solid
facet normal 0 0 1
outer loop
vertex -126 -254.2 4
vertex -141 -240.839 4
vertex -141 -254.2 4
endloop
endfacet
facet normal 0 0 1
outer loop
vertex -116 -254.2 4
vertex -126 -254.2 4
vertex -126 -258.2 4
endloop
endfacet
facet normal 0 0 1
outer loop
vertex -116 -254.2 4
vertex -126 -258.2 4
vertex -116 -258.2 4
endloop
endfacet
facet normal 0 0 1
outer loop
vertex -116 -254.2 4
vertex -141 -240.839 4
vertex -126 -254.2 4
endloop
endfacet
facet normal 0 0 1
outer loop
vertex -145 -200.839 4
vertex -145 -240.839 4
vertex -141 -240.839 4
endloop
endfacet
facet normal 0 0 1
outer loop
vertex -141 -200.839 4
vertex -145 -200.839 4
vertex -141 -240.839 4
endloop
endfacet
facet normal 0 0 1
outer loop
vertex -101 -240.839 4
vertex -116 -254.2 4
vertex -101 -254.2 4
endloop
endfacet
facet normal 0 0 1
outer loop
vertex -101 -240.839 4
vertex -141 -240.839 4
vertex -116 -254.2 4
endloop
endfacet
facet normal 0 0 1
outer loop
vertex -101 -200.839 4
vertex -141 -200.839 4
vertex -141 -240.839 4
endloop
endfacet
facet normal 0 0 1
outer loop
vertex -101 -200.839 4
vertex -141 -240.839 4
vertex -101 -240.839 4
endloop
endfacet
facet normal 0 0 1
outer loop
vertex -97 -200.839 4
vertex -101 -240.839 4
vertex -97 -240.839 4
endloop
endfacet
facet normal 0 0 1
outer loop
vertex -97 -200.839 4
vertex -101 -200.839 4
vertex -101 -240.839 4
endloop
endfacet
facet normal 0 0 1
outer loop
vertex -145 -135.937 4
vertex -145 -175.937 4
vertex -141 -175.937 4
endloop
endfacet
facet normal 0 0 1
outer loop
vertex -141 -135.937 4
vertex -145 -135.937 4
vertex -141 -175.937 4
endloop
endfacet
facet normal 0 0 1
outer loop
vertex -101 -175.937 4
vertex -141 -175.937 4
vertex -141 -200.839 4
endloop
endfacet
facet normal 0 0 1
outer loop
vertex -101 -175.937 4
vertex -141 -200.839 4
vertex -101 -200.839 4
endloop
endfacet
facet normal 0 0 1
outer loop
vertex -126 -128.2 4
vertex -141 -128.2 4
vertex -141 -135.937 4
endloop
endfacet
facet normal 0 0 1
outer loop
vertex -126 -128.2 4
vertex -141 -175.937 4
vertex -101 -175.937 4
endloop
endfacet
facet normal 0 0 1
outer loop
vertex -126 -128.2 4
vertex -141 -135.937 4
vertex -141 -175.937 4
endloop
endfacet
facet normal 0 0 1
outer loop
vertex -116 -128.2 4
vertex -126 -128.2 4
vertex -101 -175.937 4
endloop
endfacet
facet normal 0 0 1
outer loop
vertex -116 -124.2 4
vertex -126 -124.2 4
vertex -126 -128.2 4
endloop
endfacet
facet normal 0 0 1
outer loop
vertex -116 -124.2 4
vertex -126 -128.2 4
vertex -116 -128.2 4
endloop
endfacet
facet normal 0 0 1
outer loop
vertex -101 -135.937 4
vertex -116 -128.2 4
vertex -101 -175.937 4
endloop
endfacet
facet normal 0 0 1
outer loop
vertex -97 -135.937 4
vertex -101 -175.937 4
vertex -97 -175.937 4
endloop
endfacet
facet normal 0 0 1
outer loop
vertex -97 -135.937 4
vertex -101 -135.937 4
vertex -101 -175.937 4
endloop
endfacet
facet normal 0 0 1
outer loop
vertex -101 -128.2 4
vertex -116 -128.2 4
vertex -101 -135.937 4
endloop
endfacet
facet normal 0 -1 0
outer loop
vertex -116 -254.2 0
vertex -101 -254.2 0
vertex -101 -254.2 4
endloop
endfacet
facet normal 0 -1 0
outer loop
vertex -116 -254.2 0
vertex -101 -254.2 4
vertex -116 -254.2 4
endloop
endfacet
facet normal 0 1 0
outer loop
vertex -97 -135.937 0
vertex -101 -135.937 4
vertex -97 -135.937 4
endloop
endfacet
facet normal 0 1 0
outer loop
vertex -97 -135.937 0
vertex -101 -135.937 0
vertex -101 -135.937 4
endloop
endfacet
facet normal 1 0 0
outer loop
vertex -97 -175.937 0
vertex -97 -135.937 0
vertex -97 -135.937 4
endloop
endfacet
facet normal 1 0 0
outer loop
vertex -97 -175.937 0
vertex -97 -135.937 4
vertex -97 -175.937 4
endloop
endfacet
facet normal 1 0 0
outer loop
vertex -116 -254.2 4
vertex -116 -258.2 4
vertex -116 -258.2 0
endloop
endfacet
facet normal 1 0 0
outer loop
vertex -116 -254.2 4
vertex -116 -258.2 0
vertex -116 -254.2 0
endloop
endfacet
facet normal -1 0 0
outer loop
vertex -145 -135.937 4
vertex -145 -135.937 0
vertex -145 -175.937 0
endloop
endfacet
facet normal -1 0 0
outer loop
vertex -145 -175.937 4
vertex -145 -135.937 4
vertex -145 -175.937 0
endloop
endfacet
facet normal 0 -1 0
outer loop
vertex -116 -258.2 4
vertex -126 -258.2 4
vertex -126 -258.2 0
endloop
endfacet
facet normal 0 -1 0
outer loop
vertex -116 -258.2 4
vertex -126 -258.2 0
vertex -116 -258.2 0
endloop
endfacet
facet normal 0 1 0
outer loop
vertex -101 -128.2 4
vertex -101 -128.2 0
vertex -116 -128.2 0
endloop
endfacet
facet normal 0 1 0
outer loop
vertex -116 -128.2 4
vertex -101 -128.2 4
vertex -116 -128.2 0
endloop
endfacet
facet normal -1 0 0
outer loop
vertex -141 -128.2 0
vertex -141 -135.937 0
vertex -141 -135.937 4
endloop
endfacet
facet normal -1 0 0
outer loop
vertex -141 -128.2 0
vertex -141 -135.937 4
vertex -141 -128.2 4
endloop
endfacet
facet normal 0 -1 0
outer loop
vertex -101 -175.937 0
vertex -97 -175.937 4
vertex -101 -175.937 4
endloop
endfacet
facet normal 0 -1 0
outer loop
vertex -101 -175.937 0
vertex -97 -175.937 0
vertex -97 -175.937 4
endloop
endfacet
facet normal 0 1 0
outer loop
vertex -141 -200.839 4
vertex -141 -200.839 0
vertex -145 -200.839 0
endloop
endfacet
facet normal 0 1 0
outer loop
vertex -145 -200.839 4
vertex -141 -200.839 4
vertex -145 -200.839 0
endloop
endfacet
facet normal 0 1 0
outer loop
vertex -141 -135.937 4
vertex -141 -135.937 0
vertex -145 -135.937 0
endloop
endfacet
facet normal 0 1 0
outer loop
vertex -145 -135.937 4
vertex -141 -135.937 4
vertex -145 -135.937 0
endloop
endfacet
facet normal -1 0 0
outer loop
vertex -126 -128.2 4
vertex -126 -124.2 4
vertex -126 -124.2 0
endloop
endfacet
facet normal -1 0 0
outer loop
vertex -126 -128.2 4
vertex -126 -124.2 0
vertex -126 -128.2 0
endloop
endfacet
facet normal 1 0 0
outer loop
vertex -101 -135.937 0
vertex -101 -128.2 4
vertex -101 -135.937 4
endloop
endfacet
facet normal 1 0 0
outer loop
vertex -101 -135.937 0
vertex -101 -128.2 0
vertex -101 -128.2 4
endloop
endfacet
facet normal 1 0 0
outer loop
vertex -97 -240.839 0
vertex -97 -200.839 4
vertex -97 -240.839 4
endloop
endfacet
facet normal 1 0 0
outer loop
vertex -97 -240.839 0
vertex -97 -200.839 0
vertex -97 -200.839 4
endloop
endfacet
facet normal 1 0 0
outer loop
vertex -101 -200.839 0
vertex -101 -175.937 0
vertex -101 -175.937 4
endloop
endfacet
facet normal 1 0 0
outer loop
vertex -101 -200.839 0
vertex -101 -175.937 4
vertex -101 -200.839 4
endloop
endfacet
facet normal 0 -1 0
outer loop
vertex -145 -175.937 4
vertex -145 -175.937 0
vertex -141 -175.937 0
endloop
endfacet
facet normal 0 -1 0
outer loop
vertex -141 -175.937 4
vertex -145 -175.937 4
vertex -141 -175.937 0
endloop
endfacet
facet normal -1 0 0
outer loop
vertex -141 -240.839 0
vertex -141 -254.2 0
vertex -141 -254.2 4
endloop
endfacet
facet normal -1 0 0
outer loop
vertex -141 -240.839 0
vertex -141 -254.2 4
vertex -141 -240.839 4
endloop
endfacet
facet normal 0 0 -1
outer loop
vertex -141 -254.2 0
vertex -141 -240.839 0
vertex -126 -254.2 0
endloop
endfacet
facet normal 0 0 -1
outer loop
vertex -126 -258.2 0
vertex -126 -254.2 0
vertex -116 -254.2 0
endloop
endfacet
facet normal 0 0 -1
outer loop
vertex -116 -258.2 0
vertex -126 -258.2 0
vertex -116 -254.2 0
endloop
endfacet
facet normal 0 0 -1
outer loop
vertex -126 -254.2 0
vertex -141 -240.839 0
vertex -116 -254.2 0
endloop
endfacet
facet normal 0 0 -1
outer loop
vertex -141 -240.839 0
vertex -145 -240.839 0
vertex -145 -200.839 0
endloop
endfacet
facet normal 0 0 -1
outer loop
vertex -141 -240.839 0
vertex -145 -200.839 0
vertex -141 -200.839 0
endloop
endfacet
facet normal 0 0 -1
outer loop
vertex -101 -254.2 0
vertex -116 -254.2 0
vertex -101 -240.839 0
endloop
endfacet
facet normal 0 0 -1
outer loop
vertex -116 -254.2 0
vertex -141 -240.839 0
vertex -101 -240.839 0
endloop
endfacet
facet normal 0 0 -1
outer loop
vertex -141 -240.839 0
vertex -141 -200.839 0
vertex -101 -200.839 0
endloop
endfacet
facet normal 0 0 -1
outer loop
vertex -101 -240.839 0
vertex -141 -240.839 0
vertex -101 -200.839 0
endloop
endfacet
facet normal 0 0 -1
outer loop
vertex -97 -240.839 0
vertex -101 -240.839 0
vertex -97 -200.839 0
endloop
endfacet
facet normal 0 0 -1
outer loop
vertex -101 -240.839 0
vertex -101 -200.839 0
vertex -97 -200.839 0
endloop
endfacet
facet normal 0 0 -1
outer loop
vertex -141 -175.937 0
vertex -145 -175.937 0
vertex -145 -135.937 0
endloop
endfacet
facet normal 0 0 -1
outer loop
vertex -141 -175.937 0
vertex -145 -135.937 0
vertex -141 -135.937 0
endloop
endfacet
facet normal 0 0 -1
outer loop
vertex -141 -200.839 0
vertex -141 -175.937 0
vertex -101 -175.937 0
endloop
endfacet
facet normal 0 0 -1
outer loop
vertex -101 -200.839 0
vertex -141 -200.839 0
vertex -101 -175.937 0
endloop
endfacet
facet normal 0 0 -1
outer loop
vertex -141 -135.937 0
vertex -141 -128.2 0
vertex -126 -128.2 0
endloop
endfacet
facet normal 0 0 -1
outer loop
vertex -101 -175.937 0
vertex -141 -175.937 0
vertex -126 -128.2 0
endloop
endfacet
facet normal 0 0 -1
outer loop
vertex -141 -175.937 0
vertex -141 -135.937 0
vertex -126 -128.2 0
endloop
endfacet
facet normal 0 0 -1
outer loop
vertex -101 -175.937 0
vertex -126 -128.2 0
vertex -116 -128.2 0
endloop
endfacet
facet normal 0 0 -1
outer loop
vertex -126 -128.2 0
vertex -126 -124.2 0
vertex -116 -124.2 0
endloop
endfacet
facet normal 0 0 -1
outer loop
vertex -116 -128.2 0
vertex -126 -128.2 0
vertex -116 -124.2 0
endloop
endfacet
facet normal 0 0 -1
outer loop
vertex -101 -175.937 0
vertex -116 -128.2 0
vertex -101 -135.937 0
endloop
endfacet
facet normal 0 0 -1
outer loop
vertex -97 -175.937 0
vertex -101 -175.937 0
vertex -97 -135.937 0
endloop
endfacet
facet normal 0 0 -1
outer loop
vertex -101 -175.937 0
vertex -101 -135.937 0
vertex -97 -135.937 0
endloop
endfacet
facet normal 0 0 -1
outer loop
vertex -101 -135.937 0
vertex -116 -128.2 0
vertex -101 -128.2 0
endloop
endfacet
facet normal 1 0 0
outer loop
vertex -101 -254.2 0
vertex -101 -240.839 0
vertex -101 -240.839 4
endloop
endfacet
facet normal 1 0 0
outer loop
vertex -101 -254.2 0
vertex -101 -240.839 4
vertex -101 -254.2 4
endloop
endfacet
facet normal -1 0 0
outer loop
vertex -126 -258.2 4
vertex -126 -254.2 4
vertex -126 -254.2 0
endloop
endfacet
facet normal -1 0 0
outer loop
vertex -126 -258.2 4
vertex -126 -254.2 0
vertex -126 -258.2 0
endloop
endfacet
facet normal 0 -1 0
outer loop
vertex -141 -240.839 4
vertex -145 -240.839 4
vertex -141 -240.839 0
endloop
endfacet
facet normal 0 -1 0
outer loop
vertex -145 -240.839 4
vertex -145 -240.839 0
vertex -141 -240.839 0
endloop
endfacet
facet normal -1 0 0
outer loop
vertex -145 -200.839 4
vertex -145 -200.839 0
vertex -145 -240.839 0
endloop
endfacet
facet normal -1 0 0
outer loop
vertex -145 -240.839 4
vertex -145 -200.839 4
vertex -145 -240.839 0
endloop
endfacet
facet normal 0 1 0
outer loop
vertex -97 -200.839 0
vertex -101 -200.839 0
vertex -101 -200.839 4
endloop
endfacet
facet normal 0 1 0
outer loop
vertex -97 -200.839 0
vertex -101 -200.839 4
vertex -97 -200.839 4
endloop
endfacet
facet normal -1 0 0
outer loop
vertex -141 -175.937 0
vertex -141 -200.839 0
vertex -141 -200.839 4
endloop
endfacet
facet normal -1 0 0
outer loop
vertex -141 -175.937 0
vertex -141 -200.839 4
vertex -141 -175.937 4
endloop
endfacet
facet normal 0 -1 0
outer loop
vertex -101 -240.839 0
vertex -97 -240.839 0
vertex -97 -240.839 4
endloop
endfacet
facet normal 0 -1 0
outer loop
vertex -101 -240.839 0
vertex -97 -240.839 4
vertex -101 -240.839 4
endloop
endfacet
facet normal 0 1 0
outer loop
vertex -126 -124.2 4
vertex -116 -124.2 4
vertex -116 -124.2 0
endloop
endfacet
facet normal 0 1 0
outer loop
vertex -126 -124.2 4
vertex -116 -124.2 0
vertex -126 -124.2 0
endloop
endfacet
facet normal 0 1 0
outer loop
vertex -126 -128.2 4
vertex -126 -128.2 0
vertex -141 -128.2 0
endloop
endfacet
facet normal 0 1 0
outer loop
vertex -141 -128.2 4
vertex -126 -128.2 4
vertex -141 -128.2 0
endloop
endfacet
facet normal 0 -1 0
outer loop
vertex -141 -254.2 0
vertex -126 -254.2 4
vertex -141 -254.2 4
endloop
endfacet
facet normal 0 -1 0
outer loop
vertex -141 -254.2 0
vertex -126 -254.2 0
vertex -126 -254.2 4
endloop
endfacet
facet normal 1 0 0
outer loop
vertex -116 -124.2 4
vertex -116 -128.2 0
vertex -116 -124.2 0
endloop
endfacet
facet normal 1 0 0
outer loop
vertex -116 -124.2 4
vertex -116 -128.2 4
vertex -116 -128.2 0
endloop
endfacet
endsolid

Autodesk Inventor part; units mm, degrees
ref_plane "YZ Plane" through (0, 0, 0) normal (1, 0, 0) x (0, 1, 0)
ref_plane "XZ Plane" through (0, 0, 0) normal (0, 1, 0) x (-1, 0, 0)
sketch "Sketch1" plane through (0, 0, 0) normal (0, 0, 1) x (1, 0, 0)
  line L0 (-101, -200.839) -> (-97, -200.839)
  line L1 (-97, -200.839) -> (-97, -240.839)
  line L2 (-97, -240.839) -> (-101, -240.839)
  line L3 (-101, -240.839) -> (-101, -258.2)
  line L4 (-101, -128.2) -> (-101, -135.9372)
  line L5 (-101, -135.9372) -> (-97, -135.9372)
  line L6 (-97, -135.9372) -> (-97, -175.9372)
  line L7 (-97, -175.9372) -> (-101, -175.9372)
  line L8 (-101, -175.9372) -> (-101, -200.839)
  line L9 (-101, -258.2) -> (-101, -254.2)
  line L10 (-101, -254.2) -> (-141, -254.2)
  line L11 (-101, -128.2) -> (-141, -128.2)
  line L12 (-121, -128.2) -> (-121, -103.1789)
  line L13 (-145, -200.839) -> (-145, -240.839)
  line L14 (-145, -240.839) -> (-141, -240.839)
  line L15 (-141, -200.839) -> (-145, -200.839)
  line L16 (-145, -175.9372) -> (-141, -175.9372)
  line L17 (-145, -135.9372) -> (-145, -175.9372)
  line L18 (-141, -135.9372) -> (-145, -135.9372)
  line L19 (-141, -135.9372) -> (-141, -128.2)
  line L20 (-141, -254.2) -> (-141, -240.839)
  line L21 (-141, -200.839) -> (-141, -175.9372)
  point P0 (0, 0)
  dimension "d0" = 4
  dimension "d1" = 40
  dimension "d2" = 40
  dimension "d3" = 40
extrude "Extrusion1" add sketch "Sketch1" along normal blind 4
sketch "Sketch2" plane through (0, 0, 4) normal (0, 0, 1) x (1, 0, 0)
  line L0 (-97, -200.839) -> (-101, -200.839) projected
  line L1 (-101, -200.839) -> (-101, -175.9372) projected
  line L2 (-101, -175.9372) -> (-97, -175.9372) projected
  line L3 (-97, -175.9372) -> (-97, -135.9372) projected
  line L4 (-97, -135.9372) -> (-101, -135.9372) projected
  line L5 (-101, -135.9372) -> (-101, -128.2) projected
  line L6 (-101, -128.2) -> (-141, -128.2) projected
  line L7 (-141, -128.2) -> (-141, -135.9372) projected
  line L8 (-141, -135.9372) -> (-145, -135.9372) projected
  line L9 (-145, -135.9372) -> (-145, -175.9372) projected
  line L10 (-145, -175.9372) -> (-141, -175.9372) projected
  line L11 (-141, -175.9372) -> (-141, -200.839) projected
  line L12 (-141, -200.839) -> (-145, -200.839) projected
  line L13 (-145, -200.839) -> (-145, -240.839) projected
  line L14 (-145, -240.839) -> (-141, -240.839) projected
  line L15 (-141, -240.839) -> (-141, -254.2) projected
  line L16 (-141, -254.2) -> (-101, -254.2) projected
  line L17 (-101, -254.2) -> (-101, -240.839) projected
  line L18 (-101, -240.839) -> (-97, -240.839) projected
  line L19 (-97, -240.839) -> (-97, -200.839) projected
  line L20 (-126, -128.2) -> (-116, -128.2)
  line L21 (-116, -128.2) -> (-116, -124.2)
  line L22 (-116, -124.2) -> (-126, -124.2)
  line L23 (-126, -124.2) -> (-126, -128.2)
  point P0 (0, 0)
  point P1 (-121, -128.2)
  dimension "d6" = 10
  dimension "d7" = 4
extrude "Extrusion2" add sketch "Sketch2" against normal blind 4 contours L6 L23 L22 L21
ref_plane "Work Plane1" through (-101, -191.2, 4) normal (0, 1, 0) x (1, 0, 0)
mirror "Mirror1" about plane through (-101, -191.2, 4) normal (0, 1, 0) of "Extrusion2"
properties part number "F7"
